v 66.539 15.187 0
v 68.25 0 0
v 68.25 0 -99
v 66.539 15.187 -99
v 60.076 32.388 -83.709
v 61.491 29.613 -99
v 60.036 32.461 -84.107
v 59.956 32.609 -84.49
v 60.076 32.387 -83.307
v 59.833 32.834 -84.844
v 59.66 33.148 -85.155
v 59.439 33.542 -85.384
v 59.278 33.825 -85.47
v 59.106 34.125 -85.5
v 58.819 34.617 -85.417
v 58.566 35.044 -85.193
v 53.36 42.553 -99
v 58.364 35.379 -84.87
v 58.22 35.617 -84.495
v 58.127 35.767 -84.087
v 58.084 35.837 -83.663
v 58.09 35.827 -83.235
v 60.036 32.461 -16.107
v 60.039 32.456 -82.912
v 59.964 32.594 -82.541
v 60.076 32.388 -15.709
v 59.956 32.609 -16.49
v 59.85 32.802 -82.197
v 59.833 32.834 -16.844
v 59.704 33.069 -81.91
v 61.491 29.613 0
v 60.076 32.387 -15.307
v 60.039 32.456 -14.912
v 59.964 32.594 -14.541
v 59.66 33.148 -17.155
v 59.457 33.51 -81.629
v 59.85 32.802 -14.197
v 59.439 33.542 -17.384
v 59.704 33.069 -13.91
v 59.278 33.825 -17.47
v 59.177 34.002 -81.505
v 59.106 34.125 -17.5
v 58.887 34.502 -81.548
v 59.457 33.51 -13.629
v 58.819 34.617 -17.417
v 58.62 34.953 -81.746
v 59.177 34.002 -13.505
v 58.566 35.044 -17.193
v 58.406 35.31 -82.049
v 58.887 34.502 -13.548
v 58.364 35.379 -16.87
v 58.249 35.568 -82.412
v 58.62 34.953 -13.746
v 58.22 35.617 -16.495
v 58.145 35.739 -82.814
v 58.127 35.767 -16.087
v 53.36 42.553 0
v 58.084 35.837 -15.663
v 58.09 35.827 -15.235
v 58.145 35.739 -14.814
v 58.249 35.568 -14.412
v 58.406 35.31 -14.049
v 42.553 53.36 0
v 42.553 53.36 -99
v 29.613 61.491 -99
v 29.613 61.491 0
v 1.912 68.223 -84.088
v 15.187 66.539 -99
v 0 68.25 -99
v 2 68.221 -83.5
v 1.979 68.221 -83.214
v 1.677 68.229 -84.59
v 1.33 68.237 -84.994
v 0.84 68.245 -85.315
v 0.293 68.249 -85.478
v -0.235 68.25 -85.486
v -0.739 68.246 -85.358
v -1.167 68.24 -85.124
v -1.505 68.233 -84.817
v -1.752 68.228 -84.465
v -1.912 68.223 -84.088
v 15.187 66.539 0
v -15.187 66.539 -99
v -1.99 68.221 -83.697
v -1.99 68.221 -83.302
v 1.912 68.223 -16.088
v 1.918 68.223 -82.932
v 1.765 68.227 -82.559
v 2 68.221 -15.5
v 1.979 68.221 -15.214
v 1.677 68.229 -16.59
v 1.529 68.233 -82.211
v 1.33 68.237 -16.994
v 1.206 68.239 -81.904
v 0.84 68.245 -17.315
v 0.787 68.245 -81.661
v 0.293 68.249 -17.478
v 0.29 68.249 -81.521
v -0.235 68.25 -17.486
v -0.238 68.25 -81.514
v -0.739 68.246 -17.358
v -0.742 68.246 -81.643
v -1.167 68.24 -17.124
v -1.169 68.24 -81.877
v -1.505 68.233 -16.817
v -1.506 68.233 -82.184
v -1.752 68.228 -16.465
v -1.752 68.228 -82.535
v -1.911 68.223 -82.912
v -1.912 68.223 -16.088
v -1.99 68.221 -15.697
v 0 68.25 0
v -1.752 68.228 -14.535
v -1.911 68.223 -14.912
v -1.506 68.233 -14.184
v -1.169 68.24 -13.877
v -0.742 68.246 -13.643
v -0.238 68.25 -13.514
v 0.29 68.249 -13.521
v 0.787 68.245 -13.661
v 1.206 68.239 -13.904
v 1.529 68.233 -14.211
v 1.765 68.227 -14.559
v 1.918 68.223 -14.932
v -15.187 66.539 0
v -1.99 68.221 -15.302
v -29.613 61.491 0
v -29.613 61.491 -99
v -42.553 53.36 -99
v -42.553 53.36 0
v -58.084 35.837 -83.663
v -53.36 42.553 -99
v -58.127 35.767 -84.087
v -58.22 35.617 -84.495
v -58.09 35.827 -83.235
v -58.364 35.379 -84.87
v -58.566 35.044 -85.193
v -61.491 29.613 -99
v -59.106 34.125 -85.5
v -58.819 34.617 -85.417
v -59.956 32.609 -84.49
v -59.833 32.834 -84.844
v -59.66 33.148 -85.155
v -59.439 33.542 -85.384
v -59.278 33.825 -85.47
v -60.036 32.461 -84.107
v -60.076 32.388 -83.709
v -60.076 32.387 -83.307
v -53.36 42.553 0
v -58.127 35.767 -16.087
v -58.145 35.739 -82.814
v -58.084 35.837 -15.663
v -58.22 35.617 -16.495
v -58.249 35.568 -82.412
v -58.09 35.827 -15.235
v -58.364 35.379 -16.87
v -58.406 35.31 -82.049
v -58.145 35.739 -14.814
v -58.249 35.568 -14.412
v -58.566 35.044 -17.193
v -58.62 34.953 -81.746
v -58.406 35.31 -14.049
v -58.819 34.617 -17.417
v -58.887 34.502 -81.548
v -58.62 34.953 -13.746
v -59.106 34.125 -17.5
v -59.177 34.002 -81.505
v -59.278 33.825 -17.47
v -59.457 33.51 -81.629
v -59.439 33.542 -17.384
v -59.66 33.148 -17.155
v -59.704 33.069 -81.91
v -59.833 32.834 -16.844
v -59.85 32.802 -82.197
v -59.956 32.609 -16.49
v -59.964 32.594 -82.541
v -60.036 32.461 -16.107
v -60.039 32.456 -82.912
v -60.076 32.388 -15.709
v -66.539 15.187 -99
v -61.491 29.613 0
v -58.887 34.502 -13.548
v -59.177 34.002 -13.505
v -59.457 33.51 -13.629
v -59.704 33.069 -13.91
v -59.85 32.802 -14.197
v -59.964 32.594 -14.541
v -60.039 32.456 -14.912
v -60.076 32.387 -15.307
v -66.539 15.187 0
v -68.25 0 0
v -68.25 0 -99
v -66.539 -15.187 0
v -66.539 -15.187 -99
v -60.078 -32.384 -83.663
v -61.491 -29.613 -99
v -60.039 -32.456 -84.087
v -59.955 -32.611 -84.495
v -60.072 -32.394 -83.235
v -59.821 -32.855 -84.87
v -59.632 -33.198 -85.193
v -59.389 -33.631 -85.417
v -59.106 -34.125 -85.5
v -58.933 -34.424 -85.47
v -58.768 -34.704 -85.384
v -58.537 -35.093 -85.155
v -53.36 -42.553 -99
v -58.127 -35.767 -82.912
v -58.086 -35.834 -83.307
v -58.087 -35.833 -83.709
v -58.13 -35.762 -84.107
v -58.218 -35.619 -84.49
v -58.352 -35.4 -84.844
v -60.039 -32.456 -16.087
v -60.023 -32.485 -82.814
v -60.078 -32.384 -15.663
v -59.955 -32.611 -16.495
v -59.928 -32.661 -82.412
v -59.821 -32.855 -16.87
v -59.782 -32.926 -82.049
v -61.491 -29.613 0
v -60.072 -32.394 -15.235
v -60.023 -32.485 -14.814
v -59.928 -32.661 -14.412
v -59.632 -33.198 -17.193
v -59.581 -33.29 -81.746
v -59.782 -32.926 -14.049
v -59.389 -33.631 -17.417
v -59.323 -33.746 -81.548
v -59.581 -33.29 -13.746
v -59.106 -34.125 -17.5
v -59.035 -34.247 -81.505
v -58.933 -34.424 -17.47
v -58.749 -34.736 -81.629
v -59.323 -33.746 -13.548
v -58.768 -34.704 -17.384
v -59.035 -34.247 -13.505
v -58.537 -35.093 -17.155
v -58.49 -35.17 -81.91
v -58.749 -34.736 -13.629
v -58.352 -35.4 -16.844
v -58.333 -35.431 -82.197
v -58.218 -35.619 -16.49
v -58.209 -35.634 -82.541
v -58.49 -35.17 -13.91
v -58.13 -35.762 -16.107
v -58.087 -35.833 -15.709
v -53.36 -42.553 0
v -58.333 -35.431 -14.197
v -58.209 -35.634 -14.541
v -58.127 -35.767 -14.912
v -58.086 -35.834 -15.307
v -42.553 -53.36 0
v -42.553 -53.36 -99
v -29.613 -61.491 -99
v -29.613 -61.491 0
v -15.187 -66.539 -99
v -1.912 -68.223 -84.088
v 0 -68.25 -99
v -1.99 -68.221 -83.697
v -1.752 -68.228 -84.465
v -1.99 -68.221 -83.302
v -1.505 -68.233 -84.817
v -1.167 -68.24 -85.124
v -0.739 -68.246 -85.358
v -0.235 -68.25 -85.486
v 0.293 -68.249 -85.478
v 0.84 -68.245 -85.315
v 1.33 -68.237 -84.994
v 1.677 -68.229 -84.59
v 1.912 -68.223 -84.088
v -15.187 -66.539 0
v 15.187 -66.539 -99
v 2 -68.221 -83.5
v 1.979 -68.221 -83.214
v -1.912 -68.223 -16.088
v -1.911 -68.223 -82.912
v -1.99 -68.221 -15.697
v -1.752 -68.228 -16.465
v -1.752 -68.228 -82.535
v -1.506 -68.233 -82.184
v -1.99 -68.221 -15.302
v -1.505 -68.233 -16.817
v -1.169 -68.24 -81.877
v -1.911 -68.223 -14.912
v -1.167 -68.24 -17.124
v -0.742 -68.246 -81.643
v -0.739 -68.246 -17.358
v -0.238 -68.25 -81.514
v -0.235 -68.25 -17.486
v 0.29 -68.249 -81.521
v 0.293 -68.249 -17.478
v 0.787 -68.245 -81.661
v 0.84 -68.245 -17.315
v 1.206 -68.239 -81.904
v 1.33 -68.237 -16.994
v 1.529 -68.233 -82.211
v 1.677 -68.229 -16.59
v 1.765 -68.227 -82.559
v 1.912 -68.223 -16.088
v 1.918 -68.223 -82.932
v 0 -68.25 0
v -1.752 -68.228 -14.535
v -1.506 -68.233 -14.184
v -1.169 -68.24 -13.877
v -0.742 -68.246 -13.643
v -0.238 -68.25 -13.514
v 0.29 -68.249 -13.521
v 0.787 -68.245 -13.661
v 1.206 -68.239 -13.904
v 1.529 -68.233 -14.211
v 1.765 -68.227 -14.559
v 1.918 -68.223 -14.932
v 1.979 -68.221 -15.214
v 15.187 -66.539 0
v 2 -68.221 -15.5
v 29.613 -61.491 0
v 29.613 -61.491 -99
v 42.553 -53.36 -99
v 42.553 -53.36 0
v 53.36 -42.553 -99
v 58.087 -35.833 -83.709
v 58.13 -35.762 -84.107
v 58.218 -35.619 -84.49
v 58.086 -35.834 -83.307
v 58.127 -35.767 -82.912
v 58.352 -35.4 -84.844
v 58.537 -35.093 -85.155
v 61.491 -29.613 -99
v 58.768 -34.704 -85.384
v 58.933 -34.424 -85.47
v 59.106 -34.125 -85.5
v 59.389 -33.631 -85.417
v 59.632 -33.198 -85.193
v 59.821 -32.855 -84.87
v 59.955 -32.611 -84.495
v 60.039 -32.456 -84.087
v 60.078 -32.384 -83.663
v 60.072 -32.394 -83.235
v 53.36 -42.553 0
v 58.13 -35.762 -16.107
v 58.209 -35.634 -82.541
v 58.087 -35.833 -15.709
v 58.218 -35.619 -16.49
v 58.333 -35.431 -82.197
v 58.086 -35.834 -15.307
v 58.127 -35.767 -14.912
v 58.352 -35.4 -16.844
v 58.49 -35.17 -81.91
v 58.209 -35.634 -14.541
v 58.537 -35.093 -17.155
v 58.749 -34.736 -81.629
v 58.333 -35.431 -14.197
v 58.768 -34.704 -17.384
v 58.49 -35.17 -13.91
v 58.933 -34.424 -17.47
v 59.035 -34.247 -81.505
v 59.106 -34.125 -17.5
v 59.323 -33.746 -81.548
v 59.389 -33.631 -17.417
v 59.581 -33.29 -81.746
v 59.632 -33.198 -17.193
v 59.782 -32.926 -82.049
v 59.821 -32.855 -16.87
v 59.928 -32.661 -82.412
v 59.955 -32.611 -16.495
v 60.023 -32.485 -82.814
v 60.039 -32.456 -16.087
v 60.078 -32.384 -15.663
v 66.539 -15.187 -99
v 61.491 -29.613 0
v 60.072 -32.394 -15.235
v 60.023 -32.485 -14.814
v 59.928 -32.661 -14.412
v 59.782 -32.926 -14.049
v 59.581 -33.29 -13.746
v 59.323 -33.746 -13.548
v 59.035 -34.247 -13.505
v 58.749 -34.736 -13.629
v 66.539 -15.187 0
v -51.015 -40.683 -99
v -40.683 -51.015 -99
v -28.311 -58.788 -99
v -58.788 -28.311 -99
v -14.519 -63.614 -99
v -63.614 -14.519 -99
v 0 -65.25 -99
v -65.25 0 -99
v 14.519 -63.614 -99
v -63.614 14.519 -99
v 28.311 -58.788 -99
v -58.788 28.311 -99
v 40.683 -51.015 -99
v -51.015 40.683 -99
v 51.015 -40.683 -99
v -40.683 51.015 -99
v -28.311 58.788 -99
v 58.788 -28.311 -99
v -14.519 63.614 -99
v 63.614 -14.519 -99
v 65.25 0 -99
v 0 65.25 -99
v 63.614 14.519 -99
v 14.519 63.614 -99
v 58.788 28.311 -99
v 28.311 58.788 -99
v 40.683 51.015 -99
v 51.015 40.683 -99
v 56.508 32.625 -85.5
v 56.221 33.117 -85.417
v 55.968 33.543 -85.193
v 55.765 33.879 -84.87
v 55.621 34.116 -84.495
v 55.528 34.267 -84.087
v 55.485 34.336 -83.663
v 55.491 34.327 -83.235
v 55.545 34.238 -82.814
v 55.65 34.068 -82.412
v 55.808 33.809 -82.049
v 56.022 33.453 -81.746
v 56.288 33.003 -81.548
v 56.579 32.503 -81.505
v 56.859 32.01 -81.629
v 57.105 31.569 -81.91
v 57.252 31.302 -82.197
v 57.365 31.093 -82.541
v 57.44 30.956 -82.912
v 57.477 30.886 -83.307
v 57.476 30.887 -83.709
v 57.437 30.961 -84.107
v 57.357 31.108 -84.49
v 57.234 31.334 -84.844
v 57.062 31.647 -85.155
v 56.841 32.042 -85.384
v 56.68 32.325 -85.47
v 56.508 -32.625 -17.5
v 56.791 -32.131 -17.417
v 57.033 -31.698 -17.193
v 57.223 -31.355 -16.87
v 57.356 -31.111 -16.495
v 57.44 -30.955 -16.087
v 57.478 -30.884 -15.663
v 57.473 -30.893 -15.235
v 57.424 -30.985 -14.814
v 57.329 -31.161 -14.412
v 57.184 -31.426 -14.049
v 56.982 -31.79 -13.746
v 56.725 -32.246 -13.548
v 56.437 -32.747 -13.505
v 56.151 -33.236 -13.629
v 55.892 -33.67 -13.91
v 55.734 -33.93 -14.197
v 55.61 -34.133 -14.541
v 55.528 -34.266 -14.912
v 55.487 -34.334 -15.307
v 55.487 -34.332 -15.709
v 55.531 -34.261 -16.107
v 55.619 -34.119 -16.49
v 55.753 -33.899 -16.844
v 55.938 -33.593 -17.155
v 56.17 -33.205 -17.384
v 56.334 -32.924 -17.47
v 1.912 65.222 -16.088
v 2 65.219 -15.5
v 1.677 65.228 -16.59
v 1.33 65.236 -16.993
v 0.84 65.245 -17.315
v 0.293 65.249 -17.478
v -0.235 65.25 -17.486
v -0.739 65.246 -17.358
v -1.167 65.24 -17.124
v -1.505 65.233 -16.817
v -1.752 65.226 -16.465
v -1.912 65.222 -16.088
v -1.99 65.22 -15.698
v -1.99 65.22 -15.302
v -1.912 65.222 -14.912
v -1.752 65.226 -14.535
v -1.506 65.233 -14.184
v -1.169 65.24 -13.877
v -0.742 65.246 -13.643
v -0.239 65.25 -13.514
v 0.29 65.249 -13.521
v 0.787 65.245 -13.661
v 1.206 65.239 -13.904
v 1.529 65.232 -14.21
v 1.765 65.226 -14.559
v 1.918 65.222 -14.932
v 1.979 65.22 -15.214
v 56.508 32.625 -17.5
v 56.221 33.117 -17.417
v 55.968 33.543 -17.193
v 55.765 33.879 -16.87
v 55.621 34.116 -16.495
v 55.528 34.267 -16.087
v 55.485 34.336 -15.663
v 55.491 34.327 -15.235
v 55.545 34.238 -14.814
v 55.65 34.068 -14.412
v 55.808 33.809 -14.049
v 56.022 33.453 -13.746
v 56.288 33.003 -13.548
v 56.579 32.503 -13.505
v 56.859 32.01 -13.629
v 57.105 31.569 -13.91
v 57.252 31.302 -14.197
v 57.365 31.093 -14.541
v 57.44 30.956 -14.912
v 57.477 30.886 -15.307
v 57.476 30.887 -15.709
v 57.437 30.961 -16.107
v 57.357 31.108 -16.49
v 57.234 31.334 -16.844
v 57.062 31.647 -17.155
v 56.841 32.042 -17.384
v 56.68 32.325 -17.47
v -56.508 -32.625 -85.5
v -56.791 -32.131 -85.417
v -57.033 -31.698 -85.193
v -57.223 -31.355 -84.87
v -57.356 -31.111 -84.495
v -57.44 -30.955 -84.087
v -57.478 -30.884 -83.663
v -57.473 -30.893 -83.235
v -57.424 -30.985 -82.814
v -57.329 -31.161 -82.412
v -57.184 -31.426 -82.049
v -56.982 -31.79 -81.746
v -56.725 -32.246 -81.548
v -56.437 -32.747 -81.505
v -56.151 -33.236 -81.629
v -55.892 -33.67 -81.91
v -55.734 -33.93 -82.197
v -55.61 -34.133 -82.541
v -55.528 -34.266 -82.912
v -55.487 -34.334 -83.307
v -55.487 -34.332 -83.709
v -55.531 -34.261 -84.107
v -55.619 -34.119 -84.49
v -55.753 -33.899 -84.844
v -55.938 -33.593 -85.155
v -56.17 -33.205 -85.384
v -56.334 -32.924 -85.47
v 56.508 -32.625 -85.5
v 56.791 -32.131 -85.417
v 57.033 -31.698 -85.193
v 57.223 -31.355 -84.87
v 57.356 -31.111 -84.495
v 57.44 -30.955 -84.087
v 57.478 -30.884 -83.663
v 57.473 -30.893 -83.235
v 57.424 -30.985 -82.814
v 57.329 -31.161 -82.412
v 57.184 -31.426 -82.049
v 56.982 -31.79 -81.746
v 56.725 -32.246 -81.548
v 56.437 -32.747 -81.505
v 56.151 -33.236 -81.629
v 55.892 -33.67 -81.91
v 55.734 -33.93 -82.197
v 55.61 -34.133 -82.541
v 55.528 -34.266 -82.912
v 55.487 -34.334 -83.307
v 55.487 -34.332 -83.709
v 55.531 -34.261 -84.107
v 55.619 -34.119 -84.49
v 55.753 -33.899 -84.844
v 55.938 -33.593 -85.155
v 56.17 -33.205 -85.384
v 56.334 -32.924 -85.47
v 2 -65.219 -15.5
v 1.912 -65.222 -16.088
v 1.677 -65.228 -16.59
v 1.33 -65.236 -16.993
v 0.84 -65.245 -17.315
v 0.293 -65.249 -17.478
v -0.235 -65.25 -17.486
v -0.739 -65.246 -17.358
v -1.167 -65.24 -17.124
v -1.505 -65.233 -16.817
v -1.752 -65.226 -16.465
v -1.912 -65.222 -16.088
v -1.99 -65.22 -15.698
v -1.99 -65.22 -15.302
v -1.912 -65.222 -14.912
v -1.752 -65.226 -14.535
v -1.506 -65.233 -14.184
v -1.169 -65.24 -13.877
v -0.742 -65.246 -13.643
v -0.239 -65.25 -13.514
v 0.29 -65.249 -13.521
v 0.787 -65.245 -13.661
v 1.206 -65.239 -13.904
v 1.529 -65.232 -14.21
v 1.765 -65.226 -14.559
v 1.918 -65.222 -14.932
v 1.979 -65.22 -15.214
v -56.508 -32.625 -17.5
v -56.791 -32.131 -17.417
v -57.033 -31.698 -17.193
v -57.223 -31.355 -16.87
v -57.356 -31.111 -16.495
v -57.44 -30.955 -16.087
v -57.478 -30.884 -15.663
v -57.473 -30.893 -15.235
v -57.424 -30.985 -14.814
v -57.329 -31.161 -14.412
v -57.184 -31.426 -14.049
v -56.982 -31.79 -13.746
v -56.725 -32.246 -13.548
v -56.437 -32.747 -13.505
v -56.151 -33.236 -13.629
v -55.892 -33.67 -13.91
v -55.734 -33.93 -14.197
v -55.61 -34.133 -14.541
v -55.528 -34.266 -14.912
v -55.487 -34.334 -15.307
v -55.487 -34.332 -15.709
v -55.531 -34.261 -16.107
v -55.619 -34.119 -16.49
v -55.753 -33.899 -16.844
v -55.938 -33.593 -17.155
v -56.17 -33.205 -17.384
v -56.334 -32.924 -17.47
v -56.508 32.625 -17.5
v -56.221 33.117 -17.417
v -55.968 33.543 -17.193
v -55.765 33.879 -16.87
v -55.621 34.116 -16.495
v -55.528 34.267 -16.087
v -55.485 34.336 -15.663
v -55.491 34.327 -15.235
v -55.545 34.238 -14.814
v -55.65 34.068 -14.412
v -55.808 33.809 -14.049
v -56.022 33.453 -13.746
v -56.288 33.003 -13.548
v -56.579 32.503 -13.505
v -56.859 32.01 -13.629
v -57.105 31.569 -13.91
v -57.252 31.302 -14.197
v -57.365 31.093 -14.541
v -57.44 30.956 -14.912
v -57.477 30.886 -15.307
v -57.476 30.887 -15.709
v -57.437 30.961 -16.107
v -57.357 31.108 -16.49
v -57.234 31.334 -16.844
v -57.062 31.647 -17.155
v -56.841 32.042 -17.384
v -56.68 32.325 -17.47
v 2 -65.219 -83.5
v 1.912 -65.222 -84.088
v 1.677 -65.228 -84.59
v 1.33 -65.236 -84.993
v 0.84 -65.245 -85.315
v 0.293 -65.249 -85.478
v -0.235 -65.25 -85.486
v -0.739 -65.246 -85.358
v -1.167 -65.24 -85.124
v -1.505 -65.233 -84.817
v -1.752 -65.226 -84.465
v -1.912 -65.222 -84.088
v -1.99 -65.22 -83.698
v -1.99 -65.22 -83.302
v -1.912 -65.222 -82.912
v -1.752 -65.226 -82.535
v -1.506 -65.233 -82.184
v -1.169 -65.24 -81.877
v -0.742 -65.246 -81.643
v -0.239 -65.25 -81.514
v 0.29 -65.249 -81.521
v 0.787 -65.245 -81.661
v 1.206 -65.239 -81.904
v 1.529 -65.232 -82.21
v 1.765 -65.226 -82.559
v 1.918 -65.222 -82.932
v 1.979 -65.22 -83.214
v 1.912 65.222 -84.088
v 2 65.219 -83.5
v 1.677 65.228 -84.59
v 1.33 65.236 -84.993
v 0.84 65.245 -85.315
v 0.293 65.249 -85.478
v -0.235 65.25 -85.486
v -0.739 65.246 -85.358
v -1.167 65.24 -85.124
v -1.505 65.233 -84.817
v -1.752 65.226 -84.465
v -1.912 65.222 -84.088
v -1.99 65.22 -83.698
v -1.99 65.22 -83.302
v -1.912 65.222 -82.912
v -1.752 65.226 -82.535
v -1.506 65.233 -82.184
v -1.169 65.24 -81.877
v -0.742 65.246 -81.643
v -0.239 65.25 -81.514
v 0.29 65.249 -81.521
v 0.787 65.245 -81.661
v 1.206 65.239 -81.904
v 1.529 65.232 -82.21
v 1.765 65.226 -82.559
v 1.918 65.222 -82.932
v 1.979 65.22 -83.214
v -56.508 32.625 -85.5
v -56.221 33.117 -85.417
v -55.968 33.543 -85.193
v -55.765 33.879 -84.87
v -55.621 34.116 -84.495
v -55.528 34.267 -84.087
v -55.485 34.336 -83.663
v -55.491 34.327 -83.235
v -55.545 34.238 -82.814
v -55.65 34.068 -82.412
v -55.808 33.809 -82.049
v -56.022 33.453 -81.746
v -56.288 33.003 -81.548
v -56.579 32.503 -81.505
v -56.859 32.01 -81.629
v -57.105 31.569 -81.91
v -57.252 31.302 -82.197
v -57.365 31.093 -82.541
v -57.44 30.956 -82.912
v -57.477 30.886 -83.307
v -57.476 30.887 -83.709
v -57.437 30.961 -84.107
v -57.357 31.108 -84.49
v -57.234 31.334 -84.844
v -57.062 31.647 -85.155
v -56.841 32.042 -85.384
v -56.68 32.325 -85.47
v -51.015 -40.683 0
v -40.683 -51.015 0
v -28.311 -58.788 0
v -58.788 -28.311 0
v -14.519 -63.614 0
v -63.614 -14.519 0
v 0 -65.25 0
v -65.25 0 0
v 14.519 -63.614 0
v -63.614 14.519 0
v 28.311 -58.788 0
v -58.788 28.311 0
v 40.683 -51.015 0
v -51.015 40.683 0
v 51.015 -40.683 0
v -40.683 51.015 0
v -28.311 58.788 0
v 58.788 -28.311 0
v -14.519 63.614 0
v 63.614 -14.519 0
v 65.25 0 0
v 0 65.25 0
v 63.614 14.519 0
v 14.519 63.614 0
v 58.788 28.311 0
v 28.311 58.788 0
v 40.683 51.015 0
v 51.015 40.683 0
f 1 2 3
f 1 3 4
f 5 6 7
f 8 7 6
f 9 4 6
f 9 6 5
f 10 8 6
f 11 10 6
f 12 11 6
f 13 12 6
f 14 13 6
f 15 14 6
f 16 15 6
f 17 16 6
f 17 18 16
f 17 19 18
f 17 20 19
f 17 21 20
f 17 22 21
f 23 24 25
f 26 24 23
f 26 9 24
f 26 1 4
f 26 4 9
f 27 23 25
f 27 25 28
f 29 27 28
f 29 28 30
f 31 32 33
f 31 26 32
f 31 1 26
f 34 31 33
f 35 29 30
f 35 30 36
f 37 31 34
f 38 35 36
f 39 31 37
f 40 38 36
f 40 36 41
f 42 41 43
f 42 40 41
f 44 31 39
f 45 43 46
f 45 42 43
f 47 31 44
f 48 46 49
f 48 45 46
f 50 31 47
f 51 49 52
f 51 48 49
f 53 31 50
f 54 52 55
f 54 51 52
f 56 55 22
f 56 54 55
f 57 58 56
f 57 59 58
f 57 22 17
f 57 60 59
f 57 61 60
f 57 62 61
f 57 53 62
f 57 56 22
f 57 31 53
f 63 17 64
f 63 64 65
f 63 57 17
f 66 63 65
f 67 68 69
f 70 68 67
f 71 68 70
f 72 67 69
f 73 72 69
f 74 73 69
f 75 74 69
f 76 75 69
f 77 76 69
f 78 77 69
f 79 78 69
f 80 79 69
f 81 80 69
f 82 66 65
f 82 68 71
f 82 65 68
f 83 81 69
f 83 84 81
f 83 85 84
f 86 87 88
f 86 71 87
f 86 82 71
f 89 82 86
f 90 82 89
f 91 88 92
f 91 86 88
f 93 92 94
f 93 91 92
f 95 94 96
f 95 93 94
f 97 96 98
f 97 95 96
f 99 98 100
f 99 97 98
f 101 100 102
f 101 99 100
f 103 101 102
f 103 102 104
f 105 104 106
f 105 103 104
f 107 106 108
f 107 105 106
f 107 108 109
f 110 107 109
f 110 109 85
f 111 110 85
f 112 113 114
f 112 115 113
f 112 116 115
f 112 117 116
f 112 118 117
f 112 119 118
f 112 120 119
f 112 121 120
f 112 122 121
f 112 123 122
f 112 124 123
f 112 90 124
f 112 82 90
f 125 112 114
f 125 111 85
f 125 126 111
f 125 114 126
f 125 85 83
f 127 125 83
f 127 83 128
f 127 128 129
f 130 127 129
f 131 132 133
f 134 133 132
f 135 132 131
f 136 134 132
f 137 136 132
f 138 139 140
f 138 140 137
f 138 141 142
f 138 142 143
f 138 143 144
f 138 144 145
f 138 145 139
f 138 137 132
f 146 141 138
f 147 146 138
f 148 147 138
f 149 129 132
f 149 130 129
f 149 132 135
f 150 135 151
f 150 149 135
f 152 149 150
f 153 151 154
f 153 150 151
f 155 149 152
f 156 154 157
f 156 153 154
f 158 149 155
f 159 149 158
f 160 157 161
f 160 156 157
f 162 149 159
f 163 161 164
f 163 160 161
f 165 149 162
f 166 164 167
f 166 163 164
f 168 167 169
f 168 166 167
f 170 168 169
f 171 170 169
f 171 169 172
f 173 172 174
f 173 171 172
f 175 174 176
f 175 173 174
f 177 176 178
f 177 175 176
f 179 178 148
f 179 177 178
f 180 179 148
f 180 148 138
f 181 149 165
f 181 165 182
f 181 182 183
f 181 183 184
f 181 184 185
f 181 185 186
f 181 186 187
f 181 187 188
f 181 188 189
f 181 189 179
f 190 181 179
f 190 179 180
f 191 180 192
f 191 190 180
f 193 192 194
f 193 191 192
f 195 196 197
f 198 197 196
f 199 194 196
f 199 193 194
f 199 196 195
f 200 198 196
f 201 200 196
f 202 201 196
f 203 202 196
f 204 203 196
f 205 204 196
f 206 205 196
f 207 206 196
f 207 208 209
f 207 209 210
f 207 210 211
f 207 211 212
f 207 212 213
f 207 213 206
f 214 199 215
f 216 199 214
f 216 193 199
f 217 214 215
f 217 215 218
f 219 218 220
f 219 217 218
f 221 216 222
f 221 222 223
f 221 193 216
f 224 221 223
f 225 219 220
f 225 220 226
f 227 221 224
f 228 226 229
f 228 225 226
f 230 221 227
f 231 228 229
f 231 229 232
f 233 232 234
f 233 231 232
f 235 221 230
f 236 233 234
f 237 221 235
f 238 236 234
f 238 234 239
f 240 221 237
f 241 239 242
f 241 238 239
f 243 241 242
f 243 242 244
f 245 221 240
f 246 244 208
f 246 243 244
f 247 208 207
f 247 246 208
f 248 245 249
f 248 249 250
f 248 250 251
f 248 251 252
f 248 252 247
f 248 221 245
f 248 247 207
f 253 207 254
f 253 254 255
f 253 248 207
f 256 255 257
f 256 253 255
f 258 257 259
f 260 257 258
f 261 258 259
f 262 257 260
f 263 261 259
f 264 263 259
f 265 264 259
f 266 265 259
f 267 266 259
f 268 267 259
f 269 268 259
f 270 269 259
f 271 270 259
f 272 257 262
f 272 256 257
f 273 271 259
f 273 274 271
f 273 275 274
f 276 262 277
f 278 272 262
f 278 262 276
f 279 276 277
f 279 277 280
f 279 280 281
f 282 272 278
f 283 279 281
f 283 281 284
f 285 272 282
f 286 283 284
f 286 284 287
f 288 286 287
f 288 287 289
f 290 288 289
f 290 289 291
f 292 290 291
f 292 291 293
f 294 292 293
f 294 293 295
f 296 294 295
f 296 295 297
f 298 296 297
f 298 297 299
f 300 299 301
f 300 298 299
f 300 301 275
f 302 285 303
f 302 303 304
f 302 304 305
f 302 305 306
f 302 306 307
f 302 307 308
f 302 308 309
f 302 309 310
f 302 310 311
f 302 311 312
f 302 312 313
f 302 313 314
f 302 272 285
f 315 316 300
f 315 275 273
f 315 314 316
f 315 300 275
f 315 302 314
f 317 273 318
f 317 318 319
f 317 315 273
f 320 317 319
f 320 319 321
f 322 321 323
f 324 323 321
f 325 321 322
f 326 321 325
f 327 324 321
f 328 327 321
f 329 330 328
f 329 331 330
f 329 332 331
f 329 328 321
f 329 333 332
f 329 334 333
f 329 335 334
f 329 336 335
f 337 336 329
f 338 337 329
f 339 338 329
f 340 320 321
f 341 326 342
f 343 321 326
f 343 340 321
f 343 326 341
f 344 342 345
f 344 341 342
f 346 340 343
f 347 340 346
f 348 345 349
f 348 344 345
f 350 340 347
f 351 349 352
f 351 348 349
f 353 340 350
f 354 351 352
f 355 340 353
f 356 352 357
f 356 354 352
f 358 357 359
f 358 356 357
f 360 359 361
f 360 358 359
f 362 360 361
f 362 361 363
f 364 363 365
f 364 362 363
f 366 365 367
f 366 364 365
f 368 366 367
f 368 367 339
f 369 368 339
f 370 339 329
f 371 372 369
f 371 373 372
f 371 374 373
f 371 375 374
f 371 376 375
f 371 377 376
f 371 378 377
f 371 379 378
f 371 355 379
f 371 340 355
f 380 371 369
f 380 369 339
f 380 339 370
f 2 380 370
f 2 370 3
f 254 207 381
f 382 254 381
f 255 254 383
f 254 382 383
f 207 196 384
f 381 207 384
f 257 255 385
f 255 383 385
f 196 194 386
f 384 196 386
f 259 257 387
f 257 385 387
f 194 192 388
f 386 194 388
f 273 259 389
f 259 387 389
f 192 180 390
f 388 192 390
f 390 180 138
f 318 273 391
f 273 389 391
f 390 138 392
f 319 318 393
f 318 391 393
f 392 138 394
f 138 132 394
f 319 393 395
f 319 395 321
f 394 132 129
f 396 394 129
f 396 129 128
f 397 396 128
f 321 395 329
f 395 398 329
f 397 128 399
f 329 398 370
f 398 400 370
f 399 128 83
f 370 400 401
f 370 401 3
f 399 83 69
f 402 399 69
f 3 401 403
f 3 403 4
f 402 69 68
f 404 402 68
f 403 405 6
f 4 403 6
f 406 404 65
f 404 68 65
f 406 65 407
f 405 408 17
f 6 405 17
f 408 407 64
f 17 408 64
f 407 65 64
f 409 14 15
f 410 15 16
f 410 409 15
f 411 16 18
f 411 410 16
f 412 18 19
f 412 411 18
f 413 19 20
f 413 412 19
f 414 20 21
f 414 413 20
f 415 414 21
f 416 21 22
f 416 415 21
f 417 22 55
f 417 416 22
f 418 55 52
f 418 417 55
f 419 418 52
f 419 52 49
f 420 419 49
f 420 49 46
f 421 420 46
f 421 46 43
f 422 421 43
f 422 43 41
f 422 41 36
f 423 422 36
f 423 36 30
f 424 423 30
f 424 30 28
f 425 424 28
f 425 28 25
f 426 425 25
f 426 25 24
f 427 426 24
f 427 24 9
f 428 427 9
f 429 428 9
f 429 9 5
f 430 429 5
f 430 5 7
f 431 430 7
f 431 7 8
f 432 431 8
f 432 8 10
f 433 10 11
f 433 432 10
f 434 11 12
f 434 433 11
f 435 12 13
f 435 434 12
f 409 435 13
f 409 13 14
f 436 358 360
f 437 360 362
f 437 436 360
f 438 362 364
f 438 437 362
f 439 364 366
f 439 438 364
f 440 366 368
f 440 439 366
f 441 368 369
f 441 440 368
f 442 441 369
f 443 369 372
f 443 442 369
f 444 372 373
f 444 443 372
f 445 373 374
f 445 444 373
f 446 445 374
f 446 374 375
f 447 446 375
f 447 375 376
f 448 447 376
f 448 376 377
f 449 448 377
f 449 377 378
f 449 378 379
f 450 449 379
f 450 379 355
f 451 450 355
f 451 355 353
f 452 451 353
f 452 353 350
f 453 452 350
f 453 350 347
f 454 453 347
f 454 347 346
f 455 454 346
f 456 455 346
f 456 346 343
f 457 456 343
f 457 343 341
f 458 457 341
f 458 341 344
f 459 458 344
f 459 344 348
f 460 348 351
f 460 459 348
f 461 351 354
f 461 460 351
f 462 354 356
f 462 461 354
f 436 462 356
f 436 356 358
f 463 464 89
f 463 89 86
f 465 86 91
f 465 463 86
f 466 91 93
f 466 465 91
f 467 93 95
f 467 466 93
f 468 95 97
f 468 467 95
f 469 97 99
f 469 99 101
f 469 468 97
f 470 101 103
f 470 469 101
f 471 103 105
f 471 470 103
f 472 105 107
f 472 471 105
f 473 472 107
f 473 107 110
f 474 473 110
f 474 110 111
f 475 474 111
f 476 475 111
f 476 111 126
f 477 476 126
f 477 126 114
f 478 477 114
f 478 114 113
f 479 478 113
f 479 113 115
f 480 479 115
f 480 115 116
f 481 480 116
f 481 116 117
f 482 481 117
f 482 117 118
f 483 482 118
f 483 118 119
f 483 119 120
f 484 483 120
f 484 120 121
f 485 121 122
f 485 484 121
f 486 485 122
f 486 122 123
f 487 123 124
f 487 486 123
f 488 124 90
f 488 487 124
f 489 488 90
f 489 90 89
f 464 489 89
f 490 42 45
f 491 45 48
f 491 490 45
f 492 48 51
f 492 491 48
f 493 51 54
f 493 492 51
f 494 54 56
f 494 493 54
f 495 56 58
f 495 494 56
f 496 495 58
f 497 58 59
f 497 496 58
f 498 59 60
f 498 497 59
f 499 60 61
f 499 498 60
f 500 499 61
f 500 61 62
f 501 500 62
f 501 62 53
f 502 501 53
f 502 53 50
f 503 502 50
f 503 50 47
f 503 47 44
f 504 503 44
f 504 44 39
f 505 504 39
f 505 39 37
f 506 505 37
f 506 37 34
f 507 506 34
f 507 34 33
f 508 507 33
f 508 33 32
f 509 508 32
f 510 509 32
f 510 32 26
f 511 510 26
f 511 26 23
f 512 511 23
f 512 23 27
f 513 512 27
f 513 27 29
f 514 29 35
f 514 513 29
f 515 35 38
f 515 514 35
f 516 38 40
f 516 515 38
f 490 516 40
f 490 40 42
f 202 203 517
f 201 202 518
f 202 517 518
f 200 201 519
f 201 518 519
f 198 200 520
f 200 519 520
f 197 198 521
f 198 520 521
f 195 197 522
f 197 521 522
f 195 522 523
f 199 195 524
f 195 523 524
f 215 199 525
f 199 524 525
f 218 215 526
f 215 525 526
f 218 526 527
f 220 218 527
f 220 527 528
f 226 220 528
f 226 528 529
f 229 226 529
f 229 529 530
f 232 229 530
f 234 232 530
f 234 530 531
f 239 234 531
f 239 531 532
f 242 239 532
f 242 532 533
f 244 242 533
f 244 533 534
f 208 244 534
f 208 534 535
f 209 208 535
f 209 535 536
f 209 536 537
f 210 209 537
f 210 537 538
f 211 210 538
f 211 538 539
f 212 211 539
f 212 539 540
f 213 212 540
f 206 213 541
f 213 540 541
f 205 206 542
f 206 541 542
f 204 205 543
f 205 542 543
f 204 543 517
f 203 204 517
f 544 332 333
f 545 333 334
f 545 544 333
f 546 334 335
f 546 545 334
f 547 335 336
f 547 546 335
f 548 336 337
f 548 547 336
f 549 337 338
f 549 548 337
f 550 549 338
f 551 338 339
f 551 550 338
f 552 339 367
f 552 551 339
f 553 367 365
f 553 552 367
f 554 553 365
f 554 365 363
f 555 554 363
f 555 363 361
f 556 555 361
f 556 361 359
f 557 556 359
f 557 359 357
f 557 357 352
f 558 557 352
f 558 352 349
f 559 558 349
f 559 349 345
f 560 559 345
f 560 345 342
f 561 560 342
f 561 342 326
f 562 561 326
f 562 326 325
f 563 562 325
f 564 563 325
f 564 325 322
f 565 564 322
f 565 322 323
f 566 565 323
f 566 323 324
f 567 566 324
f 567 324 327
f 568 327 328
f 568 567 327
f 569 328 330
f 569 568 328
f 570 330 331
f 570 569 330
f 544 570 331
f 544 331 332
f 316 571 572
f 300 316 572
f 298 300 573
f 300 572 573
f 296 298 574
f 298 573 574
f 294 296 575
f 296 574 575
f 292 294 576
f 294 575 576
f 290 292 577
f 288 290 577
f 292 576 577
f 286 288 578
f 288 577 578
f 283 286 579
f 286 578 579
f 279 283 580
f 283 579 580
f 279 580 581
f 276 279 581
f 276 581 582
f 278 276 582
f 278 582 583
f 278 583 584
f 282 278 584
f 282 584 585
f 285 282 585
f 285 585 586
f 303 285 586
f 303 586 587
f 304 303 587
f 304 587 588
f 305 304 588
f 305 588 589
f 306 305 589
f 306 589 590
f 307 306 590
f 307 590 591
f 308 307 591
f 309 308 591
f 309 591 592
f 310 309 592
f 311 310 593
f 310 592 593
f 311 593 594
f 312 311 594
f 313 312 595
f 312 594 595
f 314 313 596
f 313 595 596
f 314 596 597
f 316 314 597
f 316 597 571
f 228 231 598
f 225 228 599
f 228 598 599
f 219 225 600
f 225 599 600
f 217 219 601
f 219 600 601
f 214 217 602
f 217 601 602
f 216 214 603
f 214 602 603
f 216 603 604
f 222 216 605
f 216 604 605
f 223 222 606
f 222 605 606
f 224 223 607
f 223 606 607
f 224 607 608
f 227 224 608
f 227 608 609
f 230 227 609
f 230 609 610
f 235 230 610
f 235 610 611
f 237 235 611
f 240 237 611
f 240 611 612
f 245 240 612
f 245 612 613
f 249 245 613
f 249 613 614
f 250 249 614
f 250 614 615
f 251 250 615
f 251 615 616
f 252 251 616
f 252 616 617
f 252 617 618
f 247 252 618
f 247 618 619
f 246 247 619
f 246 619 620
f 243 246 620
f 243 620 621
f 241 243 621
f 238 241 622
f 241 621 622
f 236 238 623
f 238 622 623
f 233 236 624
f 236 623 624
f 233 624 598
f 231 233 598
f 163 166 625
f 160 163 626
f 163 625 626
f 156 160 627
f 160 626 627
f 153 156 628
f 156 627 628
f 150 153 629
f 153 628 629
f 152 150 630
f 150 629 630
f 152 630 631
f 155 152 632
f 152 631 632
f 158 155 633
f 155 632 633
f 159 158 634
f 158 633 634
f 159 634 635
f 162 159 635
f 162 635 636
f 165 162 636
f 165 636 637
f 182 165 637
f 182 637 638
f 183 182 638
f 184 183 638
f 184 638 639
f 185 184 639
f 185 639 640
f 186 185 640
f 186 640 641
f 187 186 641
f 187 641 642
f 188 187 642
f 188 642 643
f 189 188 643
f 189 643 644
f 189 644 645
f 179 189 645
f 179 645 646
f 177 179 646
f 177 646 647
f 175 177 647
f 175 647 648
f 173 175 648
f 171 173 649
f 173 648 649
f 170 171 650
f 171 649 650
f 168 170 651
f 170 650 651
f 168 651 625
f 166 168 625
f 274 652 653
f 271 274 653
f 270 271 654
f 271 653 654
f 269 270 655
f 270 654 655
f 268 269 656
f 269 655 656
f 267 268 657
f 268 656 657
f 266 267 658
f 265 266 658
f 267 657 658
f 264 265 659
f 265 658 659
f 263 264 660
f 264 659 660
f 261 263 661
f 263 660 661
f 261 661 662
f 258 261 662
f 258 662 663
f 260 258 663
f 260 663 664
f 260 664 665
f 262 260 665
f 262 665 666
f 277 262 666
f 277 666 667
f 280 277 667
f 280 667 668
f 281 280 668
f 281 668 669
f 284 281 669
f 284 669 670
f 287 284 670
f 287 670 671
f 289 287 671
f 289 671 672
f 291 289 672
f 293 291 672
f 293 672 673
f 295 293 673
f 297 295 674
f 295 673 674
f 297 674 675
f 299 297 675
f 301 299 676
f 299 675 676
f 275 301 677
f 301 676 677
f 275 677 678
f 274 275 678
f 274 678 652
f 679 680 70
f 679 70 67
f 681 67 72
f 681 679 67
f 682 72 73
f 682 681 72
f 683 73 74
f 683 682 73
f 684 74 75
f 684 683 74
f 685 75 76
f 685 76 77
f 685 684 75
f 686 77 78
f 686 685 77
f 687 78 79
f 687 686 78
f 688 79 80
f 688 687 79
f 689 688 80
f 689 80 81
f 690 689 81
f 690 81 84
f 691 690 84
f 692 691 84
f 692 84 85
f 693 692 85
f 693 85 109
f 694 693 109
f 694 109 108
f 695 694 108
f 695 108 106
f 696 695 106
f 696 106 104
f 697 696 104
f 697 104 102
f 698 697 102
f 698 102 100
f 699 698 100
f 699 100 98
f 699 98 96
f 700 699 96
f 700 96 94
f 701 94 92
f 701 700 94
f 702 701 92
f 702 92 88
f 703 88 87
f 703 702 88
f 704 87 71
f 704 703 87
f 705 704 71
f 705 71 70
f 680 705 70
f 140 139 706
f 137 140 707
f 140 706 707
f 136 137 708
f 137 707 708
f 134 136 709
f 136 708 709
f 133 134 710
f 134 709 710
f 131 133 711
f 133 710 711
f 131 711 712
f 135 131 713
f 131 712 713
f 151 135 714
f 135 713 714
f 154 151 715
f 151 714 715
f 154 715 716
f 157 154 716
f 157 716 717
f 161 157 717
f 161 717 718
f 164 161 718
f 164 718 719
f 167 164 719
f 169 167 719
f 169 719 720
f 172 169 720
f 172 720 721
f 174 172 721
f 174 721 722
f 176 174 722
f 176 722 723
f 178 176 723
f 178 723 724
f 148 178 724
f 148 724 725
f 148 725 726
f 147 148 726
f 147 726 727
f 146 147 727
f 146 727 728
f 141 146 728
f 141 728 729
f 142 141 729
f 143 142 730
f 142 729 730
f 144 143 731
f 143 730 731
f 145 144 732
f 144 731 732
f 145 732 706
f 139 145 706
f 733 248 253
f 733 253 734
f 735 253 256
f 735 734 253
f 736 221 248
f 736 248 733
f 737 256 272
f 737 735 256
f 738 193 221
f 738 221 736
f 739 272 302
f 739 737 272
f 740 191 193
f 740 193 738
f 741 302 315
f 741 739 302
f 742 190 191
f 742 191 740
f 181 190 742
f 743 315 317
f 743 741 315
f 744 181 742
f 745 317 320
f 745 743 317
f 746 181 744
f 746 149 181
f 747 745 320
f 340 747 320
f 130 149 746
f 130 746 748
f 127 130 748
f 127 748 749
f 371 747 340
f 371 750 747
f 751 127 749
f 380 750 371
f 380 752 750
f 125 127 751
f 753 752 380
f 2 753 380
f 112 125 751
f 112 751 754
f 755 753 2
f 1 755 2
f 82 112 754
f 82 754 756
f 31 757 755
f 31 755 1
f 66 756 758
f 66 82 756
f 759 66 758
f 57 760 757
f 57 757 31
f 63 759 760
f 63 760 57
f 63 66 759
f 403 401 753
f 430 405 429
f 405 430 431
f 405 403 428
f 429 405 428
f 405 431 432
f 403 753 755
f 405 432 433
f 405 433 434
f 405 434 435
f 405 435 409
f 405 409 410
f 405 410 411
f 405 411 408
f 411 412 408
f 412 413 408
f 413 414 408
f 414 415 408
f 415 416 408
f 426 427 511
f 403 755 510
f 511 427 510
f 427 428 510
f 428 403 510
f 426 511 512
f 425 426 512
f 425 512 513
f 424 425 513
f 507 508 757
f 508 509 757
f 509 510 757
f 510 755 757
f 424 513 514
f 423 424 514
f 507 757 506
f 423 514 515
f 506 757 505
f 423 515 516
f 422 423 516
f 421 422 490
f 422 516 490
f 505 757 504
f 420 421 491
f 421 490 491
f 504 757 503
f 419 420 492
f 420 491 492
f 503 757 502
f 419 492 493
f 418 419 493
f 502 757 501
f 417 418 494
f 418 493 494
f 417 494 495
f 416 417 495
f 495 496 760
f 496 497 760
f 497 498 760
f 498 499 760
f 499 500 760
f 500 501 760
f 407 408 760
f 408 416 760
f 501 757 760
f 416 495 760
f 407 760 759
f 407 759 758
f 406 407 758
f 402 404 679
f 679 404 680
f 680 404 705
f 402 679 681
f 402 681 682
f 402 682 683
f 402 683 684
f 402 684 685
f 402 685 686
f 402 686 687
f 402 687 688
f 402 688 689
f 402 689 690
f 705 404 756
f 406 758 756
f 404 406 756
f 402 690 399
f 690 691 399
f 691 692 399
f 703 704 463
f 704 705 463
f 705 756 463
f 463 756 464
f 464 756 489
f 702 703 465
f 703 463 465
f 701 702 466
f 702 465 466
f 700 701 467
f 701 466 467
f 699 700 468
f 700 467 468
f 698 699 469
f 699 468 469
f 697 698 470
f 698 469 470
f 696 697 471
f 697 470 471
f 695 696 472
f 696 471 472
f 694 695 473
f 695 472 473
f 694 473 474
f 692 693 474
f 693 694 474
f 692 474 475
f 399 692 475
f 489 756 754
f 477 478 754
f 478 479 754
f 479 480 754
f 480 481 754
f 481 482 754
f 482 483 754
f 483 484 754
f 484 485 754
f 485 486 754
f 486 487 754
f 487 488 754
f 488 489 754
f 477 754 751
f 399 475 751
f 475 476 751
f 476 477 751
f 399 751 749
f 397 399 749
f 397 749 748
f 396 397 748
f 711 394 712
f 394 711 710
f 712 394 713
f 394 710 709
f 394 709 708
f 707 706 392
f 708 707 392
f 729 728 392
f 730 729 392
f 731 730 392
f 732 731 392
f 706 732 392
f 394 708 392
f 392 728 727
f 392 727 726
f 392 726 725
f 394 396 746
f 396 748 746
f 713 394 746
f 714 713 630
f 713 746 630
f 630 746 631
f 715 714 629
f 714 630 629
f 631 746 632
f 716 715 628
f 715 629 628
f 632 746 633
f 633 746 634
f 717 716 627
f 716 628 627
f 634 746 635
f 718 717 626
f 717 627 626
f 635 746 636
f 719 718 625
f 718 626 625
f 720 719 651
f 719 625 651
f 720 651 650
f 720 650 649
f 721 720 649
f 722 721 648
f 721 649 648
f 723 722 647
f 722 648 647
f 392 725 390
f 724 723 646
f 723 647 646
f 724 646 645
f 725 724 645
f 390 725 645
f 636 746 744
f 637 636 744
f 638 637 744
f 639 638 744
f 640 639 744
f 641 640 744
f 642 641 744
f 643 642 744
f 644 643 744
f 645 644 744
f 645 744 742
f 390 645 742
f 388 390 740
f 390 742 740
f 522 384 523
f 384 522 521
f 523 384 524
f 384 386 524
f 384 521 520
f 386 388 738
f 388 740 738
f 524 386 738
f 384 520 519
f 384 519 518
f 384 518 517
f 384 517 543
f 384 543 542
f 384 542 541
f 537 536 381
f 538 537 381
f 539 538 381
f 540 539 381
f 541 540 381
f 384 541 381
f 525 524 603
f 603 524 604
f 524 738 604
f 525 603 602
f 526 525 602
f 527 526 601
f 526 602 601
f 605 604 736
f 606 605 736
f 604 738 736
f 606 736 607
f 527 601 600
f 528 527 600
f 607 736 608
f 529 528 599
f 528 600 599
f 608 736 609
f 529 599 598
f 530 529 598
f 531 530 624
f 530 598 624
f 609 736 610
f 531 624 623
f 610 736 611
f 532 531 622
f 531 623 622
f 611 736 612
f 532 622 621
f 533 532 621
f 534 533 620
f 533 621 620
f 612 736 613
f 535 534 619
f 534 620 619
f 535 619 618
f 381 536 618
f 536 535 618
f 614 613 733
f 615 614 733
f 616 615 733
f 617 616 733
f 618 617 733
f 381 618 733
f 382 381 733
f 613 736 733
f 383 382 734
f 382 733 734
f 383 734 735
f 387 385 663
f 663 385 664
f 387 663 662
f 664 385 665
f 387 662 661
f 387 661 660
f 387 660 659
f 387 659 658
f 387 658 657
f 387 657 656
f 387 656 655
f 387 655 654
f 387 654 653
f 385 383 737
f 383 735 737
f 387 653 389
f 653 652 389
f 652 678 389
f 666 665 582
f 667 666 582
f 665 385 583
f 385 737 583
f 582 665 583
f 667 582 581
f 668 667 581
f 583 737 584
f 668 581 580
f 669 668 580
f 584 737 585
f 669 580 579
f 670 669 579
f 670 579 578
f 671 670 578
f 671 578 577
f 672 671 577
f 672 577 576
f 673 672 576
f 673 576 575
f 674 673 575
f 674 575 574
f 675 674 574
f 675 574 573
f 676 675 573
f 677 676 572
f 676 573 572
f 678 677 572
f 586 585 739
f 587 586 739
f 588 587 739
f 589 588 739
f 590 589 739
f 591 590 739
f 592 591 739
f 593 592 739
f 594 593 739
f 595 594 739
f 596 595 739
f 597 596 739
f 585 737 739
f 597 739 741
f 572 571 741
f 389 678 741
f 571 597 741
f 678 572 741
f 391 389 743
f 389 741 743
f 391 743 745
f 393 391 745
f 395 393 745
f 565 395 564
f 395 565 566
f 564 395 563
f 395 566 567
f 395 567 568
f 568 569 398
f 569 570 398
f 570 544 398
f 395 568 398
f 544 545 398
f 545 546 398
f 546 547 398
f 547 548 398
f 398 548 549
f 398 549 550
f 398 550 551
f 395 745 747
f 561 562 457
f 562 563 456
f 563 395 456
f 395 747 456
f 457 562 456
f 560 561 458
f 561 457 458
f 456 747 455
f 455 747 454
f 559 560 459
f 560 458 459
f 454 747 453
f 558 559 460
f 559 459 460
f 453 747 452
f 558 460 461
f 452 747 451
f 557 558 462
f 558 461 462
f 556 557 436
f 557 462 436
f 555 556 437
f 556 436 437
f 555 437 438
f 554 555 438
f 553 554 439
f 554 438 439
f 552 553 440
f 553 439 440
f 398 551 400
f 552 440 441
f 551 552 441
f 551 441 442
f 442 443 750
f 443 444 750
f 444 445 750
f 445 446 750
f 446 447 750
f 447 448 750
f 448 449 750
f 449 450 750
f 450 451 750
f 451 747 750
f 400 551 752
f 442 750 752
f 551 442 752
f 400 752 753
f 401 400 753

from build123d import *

# Parameters (mm, degrees)
SKETCH1_R               = 68.25
SKETCH1_R_2             = 65.25
BOSS_EXTRUDE1_DEPTH     = 99
SKETCH2_R               = 2
CUT_EXTRUDE1_DEPTH      = 44.106233808
CUT_EXTRUDE1_DEPTH_BACK = 144.356233808
SKETCH3_R               = 2
CUT_EXTRUDE2_DEPTH      = 19.1250001
CUT_EXTRUDE2_DEPTH_BACK = 119.3750001
SKETCH4_R               = 2
CUT_EXTRUDE3_DEPTH      = 48.356233952
CUT_EXTRUDE3_DEPTH_BACK = 140.106233952


with BuildPart() as part:
    # Sketch1 → Boss-Extrude1 (new body)
    with BuildSketch(Plane.XY):
        Circle(SKETCH1_R)
        Circle(SKETCH1_R_2, mode=Mode.SUBTRACT)
    extrude(amount=-BOSS_EXTRUDE1_DEPTH)

    # Sketch2 → Cut-Extrude1 (cut, two sides)
    with BuildSketch(Plane(origin=(41.534523365, -28.310095264, -87.5), x_dir=(0, 0, -1), z_dir=(0.866025404, -0.5, 0))) as cut_extrude1_sk:
        with Locations((-4, 3.75)):
            Circle(SKETCH2_R)
        with Locations((-72, 3.75)):
            Circle(SKETCH2_R)
    extrude(amount=CUT_EXTRUDE1_DEPTH, mode=Mode.SUBTRACT)
    extrude(cut_extrude1_sk.sketch, amount=-CUT_EXTRUDE1_DEPTH_BACK, mode=Mode.SUBTRACT)

    # Sketch3 → Cut-Extrude2 (cut, two sides)
    with BuildSketch(Plane(origin=(3.75, 50.125, -87.5), x_dir=(1, 0, 0), z_dir=(0, 1, 0))) as cut_extrude2_sk:
        with Locations((-3.75, -4)):
            Circle(SKETCH3_R)
        with Locations((-3.75, -72)):
            Circle(SKETCH3_R)
    extrude(amount=CUT_EXTRUDE2_DEPTH, mode=Mode.SUBTRACT)
    extrude(cut_extrude2_sk.sketch, amount=-CUT_EXTRUDE2_DEPTH_BACK, mode=Mode.SUBTRACT)

    # Sketch4 → Cut-Extrude3 (cut, two sides)
    with BuildSketch(Plane(origin=(41.603915399, 19.689904736, -87.5), x_dir=(0, 0, -1), z_dir=(0.866025404, 0.5, 0))) as cut_extrude3_sk:
        with Locations((-4, 3.75)):
            Circle(SKETCH4_R)
        with Locations((-72, 3.75)):
            Circle(SKETCH4_R)
    extrude(amount=CUT_EXTRUDE3_DEPTH, mode=Mode.SUBTRACT)
    extrude(cut_extrude3_sk.sketch, amount=-CUT_EXTRUDE3_DEPTH_BACK, mode=Mode.SUBTRACT)


solid = part.part
